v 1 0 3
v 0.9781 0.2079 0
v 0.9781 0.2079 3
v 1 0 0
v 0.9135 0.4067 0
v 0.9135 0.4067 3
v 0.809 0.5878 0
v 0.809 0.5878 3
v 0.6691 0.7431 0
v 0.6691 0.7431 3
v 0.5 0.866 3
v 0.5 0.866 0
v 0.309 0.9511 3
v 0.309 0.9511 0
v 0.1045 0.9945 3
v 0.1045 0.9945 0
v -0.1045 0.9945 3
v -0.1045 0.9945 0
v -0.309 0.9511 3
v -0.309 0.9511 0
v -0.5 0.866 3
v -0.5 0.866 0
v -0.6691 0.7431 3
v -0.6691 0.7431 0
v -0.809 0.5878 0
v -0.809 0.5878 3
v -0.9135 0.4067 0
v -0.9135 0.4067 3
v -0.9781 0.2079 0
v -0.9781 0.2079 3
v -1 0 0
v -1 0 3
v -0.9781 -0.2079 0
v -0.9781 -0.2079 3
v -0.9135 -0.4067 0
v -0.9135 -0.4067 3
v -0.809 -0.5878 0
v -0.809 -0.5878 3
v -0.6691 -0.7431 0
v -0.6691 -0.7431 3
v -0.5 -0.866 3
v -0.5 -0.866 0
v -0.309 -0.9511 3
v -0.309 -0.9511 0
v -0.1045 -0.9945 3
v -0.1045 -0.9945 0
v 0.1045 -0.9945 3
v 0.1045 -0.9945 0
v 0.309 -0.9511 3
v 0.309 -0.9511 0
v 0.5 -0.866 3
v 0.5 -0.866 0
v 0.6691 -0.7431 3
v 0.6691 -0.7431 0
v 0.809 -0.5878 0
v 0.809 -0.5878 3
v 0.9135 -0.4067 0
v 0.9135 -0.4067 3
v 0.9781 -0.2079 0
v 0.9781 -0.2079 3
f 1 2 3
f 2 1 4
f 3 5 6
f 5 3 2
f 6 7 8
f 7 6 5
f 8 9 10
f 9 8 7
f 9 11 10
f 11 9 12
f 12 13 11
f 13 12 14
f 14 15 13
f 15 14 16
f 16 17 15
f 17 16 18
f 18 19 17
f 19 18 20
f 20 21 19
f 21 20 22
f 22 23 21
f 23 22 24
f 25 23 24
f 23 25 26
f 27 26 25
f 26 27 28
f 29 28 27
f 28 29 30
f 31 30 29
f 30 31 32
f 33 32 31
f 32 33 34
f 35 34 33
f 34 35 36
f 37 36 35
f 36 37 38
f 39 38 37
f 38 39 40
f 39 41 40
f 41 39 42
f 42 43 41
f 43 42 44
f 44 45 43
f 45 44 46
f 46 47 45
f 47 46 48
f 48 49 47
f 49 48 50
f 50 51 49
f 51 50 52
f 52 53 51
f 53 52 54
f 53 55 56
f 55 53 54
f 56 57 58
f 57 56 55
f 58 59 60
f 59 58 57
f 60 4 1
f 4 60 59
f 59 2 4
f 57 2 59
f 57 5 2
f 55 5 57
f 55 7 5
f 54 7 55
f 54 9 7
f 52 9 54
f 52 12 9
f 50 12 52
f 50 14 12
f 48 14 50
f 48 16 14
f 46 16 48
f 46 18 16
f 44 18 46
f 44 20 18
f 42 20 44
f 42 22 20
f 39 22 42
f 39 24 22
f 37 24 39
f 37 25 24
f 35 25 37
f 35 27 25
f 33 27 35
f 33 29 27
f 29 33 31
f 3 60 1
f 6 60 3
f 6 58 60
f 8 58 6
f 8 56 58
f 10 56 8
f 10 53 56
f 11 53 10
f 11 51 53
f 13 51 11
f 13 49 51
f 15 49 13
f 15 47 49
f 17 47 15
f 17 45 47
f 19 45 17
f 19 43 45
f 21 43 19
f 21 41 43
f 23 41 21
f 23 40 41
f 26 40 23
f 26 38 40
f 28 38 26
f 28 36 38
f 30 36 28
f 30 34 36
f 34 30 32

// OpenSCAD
// [inibitore,  raggio, facce, altezza]
genome_in = [];
genome = genome_in;
gene_len=4;
function altezz(index) = ( index == 0 ? 0 : genome[index-gene_len]*genome[index-1] + altezz(index-gene_len) ); 

raggi = [ for (i = [1 : gene_len : len(genome)]) genome[i] ];
min_r = min(raggi);

translate([0,0,-altezz(len(genome))/2]){
for (g=[0:gene_len:len(genome)-gene_len]){
    inibitore = genome[g];
    raggio = genome[g+1];
    facce = genome[g+2];
    altezza = genome[g+3];
    if(inibitore==1){ 
        translate([0,0,altezz(g)])
            linear_extrude(height = altezza)
                    difference(){
                        circle(raggio,$fn=facce);
                        circle(min_r-2,$fn=30);
                    }
    }

}

//tappo

 cylinder(h = 3, r = min_r-1, $fn=30);
}
